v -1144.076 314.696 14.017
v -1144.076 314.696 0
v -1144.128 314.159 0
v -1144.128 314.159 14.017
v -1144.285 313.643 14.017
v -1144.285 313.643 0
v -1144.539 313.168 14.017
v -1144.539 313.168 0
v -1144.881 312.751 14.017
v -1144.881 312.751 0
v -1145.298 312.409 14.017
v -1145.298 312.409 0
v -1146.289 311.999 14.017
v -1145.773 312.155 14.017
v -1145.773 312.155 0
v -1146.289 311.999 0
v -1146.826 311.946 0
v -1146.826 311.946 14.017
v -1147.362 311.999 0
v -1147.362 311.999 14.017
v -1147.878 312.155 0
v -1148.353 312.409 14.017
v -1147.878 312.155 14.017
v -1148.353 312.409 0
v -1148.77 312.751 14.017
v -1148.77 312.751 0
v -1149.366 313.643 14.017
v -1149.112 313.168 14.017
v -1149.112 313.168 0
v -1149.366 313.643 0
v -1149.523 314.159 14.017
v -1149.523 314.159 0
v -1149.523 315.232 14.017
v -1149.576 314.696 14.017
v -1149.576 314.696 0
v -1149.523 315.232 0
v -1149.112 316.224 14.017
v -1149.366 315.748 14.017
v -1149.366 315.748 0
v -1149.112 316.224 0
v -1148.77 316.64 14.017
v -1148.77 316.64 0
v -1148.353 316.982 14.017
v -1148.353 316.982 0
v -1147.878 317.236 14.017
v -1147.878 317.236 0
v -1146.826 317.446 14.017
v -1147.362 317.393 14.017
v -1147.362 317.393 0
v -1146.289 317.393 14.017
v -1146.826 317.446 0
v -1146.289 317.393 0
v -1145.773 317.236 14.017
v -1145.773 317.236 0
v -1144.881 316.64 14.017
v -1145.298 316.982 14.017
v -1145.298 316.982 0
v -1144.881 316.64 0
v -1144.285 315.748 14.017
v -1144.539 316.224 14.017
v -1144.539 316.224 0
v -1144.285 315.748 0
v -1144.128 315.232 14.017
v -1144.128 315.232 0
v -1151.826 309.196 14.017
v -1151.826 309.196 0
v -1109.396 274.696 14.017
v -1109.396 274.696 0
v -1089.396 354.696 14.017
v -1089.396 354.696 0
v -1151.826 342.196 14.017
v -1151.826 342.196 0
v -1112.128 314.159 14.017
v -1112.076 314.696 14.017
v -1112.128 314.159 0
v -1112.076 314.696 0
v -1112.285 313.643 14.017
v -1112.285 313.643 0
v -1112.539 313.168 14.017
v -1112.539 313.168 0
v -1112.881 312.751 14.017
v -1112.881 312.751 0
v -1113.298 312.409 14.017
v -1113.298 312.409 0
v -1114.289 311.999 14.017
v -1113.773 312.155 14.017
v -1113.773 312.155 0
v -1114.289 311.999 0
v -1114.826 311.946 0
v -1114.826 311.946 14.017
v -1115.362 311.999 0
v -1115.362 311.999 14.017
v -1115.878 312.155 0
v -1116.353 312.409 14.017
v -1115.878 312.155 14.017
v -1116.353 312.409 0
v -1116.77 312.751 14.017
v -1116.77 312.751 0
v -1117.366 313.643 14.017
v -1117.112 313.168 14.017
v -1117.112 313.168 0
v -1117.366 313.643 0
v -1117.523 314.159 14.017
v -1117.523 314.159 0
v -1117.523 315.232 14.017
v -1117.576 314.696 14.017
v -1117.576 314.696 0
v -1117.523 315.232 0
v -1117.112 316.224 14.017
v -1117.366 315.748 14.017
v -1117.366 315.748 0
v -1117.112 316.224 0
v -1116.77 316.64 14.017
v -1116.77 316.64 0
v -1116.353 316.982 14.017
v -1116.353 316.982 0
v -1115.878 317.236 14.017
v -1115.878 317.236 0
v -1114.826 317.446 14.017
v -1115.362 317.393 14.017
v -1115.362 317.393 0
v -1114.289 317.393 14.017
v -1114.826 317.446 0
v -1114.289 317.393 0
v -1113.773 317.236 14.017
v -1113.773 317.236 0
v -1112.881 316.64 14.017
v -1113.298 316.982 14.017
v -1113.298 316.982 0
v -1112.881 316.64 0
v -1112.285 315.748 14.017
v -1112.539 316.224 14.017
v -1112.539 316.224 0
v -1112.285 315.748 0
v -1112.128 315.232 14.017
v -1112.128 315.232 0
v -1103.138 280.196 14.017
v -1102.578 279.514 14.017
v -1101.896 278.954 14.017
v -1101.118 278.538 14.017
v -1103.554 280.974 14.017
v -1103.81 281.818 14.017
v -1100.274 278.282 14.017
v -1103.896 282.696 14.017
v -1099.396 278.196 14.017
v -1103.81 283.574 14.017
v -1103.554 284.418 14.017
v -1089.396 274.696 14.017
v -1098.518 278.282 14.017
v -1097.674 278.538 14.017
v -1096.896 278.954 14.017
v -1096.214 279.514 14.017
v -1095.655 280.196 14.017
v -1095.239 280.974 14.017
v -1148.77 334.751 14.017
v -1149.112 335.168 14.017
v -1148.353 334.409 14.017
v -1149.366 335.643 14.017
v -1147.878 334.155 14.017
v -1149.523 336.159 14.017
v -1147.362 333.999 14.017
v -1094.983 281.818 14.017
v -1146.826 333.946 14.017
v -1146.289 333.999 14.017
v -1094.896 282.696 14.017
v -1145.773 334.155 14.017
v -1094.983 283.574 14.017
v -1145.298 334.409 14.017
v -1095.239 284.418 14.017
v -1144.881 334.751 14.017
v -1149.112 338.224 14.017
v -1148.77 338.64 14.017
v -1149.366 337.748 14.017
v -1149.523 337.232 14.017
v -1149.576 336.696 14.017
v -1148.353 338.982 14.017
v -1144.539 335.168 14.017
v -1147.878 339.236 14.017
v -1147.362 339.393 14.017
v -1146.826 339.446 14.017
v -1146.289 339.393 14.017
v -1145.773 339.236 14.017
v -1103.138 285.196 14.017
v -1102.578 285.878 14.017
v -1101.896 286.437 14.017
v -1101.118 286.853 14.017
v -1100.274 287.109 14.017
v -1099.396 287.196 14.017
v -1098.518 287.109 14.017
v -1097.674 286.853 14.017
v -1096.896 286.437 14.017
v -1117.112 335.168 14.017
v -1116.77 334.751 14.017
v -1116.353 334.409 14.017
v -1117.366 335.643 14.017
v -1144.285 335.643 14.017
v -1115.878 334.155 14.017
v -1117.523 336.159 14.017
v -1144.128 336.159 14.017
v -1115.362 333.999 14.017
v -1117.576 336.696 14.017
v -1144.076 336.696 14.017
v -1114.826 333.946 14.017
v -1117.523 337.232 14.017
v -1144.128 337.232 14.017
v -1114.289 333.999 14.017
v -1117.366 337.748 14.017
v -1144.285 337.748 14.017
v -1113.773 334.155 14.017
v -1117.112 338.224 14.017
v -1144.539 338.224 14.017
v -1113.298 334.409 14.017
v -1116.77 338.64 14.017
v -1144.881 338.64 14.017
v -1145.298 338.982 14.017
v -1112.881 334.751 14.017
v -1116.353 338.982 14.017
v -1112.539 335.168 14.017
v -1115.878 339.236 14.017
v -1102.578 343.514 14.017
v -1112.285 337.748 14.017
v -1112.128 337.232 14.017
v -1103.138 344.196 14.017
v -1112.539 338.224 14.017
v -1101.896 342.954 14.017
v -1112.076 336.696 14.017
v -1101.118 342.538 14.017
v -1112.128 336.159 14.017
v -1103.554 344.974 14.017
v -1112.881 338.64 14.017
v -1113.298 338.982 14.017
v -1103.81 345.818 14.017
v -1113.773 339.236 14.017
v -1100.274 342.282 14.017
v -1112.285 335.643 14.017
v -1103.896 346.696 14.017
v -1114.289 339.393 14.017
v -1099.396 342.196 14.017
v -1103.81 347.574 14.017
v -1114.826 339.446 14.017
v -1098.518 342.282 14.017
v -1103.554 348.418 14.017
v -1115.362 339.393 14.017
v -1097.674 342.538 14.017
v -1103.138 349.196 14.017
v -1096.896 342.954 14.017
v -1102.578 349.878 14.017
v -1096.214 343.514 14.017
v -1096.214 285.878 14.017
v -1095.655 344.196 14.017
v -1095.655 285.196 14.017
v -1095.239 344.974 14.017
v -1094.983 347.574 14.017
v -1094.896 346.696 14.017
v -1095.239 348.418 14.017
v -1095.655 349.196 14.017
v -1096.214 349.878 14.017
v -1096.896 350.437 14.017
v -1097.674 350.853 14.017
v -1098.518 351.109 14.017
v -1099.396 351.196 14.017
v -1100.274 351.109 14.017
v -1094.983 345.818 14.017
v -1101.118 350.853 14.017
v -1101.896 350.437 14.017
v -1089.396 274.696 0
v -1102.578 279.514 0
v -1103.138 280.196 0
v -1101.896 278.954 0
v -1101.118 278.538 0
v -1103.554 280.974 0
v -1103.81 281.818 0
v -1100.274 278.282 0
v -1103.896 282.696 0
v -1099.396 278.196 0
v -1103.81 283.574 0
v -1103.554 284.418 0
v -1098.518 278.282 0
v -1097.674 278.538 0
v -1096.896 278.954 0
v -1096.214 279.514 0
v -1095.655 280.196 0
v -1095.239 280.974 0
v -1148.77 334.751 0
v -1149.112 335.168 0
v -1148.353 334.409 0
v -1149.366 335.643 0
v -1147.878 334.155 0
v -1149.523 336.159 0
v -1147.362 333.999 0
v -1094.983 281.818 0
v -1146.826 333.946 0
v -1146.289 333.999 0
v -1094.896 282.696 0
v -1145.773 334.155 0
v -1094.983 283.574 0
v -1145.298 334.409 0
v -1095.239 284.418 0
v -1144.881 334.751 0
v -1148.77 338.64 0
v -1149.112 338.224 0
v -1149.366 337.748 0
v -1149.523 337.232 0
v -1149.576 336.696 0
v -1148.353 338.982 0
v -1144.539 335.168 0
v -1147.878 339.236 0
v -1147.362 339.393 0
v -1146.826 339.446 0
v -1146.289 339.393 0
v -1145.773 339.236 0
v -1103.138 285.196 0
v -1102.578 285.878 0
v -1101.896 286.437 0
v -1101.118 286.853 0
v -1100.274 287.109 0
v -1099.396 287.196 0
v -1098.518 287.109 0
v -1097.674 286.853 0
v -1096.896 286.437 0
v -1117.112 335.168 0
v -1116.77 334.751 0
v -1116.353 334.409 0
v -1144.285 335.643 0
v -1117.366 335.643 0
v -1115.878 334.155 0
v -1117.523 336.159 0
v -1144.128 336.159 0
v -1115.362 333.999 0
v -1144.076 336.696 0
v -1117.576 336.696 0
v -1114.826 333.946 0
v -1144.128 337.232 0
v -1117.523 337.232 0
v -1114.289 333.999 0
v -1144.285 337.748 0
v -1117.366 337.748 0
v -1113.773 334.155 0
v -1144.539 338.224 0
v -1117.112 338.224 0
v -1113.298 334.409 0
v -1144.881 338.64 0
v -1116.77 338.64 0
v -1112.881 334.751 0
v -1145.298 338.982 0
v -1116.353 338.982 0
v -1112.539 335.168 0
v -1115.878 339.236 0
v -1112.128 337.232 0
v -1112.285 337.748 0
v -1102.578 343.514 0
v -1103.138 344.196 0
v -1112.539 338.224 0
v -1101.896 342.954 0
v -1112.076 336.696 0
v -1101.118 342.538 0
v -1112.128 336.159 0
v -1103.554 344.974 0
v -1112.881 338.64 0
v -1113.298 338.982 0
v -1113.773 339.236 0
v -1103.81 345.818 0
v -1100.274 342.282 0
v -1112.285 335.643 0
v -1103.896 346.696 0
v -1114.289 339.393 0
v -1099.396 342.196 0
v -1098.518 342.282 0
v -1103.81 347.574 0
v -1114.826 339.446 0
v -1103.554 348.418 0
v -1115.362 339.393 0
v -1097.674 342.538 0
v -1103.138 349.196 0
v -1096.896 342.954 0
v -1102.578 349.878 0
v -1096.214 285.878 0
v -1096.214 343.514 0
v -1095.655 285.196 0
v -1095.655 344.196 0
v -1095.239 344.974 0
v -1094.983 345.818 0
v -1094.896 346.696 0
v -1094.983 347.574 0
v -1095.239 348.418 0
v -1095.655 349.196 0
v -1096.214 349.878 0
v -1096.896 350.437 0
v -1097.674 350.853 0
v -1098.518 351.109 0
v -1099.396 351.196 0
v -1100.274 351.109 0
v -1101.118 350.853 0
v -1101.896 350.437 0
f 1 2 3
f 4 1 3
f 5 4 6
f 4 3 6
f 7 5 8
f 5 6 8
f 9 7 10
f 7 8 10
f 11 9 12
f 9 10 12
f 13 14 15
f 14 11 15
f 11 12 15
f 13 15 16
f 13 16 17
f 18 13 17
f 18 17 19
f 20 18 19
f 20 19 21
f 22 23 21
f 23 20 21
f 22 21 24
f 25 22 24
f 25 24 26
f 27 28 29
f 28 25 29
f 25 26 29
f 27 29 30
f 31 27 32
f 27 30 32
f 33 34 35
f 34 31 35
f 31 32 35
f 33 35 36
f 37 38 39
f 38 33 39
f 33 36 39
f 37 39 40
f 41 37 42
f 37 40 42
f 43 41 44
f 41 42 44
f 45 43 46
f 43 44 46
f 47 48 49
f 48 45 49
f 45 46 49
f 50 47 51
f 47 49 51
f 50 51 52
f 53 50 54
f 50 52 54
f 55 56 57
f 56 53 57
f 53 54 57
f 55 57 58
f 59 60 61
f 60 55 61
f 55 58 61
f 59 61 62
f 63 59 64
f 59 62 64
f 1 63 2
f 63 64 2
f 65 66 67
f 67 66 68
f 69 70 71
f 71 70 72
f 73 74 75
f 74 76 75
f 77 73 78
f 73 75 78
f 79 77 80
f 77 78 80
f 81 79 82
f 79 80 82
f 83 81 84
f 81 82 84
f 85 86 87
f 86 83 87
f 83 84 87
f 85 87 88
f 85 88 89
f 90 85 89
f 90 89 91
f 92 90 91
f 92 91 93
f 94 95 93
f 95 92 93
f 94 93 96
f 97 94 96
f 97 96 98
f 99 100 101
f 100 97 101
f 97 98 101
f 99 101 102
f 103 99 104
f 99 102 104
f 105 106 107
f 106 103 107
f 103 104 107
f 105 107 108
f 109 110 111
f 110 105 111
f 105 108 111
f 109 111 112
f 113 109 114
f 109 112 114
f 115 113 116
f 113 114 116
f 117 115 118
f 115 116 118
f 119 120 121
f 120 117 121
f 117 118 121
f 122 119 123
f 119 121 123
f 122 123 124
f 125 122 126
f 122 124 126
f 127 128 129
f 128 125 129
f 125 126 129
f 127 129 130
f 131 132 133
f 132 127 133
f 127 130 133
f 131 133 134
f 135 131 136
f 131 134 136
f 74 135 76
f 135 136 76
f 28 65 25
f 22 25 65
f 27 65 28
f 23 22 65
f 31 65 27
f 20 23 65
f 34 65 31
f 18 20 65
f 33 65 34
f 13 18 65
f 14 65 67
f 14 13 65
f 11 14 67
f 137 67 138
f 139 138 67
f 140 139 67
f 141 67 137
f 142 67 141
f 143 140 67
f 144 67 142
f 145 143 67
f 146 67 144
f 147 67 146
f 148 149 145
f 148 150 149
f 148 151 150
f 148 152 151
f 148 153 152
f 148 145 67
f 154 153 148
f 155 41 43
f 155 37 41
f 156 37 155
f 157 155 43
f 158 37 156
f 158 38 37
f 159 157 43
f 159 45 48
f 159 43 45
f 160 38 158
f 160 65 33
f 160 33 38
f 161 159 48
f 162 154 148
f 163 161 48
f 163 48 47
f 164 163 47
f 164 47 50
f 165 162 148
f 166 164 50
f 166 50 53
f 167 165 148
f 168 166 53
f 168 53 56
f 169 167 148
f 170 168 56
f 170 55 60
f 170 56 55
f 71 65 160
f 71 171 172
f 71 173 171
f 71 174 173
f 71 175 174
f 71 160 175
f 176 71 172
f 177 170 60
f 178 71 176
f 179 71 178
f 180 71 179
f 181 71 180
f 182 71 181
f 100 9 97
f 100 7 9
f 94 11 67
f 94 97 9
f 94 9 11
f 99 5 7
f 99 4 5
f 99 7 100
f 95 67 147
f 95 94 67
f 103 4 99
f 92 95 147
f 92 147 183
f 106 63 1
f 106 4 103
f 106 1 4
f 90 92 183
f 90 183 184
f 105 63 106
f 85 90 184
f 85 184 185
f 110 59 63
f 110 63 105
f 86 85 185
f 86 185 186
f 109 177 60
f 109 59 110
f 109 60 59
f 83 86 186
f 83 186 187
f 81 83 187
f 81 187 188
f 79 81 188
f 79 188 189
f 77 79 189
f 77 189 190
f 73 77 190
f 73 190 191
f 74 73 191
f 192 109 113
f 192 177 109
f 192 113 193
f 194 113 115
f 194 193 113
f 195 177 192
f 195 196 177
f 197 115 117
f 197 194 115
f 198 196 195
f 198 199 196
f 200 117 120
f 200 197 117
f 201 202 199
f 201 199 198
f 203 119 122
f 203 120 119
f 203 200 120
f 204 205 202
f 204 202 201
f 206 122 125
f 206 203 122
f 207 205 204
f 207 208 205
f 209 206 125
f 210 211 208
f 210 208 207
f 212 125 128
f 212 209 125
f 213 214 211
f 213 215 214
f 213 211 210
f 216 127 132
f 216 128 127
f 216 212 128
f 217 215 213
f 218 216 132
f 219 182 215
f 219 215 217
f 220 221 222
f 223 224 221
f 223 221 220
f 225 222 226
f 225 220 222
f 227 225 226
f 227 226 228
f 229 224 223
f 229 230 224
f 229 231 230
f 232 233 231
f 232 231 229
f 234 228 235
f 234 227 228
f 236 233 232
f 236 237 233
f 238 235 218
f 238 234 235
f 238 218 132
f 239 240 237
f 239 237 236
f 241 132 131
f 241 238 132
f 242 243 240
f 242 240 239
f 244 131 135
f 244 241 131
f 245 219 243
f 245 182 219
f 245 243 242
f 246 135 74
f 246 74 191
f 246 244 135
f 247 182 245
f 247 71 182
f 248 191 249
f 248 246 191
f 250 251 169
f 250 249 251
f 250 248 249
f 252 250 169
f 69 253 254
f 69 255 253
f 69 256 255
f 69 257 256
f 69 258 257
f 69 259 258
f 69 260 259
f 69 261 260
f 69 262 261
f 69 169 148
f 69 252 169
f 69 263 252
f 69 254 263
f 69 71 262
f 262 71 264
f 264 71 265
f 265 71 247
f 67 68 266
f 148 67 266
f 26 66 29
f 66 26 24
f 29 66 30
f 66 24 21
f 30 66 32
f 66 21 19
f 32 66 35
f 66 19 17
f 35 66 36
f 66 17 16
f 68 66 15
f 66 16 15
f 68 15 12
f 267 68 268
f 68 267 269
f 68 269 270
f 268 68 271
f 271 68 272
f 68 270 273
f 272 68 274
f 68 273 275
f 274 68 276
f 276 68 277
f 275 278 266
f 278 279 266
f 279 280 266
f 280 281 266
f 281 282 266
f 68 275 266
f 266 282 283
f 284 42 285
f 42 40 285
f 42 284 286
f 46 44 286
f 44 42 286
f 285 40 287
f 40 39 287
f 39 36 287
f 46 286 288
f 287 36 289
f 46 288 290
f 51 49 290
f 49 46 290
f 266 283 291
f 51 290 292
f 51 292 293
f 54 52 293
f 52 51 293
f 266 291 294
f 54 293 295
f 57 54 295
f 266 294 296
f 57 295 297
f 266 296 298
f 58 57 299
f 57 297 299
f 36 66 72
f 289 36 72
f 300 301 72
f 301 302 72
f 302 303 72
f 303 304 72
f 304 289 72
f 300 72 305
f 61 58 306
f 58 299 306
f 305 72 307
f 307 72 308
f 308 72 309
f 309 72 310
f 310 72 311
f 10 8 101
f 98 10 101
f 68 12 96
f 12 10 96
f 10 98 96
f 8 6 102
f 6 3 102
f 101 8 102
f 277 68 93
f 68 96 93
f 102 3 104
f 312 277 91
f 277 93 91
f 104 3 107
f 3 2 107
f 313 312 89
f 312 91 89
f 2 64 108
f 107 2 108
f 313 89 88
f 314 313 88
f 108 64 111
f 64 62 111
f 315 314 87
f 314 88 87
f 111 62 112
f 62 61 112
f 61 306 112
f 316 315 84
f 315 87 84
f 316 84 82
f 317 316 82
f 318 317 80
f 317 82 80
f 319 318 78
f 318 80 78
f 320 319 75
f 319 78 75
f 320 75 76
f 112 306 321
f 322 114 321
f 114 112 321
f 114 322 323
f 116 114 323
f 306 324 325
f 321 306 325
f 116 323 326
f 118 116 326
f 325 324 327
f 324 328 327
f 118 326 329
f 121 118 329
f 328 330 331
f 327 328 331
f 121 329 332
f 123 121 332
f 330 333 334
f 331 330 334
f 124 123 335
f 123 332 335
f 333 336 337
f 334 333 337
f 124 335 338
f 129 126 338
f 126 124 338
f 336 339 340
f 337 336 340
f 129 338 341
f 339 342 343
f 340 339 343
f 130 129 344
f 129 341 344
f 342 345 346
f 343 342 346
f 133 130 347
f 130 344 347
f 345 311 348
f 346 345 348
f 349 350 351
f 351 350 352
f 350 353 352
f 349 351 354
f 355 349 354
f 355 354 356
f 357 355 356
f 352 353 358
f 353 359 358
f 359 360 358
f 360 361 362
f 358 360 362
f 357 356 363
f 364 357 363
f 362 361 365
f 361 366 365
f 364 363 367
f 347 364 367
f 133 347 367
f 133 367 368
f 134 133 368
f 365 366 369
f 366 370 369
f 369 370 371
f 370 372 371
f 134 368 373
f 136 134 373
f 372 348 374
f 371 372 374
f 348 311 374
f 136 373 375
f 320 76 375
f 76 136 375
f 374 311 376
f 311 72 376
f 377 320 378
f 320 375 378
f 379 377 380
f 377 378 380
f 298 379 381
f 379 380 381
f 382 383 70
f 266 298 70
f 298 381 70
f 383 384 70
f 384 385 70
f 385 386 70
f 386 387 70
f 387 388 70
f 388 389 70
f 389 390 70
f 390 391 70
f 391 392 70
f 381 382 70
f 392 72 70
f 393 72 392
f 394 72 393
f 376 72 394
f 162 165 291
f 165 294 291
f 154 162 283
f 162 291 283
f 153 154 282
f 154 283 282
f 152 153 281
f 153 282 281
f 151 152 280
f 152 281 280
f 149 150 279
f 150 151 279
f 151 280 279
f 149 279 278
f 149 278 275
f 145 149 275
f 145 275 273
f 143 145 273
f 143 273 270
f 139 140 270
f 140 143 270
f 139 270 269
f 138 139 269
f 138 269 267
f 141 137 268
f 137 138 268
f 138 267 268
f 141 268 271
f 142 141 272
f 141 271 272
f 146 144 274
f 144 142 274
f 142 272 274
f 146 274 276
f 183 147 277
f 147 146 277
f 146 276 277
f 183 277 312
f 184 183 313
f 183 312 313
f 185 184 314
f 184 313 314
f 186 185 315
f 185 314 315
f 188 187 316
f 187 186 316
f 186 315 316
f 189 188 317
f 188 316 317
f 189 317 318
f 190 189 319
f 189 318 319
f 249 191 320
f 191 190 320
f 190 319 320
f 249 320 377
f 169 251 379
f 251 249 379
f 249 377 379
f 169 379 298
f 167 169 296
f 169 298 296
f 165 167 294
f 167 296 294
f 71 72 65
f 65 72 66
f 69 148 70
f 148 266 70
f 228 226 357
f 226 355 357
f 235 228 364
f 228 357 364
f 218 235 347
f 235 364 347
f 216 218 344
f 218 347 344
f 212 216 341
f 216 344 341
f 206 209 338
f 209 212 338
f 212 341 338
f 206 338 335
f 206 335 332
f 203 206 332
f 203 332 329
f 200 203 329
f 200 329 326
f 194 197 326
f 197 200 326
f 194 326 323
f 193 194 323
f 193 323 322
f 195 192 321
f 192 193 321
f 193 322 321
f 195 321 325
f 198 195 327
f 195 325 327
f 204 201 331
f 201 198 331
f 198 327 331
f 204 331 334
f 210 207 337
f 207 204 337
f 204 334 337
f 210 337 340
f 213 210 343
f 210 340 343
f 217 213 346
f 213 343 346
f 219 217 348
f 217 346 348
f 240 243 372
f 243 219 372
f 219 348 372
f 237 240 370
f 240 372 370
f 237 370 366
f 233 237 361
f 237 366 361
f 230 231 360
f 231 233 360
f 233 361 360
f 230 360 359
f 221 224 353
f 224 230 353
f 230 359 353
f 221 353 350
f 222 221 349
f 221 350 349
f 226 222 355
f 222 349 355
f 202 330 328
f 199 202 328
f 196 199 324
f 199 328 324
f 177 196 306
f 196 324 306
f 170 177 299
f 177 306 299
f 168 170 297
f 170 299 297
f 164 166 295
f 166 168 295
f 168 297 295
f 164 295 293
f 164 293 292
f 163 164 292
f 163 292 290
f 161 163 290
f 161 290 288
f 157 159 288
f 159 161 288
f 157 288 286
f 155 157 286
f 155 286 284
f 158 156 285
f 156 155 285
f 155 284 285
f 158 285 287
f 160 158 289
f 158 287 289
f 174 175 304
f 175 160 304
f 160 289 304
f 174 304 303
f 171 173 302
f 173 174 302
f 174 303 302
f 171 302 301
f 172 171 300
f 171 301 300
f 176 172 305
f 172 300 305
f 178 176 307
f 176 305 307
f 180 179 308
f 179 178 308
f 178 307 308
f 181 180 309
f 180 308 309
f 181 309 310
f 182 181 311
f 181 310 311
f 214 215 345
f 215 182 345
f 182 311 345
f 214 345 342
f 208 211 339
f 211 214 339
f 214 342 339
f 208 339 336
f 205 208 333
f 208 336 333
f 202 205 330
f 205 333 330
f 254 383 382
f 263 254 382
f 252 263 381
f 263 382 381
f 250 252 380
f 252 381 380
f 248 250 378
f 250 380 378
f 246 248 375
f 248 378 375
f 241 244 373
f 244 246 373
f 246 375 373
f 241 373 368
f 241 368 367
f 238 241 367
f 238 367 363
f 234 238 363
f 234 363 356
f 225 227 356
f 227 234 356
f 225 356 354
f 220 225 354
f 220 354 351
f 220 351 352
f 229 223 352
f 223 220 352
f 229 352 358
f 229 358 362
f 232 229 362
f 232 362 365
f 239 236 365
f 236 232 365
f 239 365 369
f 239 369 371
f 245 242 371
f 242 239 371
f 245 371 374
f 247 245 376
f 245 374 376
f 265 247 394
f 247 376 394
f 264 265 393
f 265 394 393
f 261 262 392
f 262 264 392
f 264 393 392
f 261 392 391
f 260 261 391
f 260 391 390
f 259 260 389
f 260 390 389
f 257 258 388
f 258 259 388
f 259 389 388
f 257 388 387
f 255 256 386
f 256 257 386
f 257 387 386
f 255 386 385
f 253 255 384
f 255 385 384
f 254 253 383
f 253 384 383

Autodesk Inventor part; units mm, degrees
ref_plane "YZ Plane" through (0, 0, 0) normal (1, 0, 0) x (0, 1, 0)
ref_plane "XZ Plane" through (0, 0, 0) normal (0, 1, 0) x (-1, 0, 0)
ref_plane "XY Plane" through (0, 0, 0) normal (0, 0, 1) x (1, 0, 0)
sketch "スケッチ1 outline for 押し出し1" plane through (0, 0, 0) normal (0, 0, 1) x (1, 0, 0)
  line L0 (-1089.396157, 354.695803) -> (-1151.82556, 342.195803)
  line L1 (-1089.396157, 274.695803) -> (-1089.396157, 354.695803)
  line L2 (-1151.82556, 342.195803) -> (-1151.82556, 309.195803)
  line L3 (-1109.396157, 274.695803) -> (-1089.396157, 274.695803)
  line L4 (-1151.82556, 309.195803) -> (-1109.396157, 274.695803)
  circle A0 centre (-1099.396157, 282.695803) radius 4.5
  circle A1 centre (-1146.82556, 314.695803) radius 2.75
  circle A2 centre (-1146.82556, 336.695803) radius 2.75
  circle A3 centre (-1114.82556, 314.695803) radius 2.75
  circle A4 centre (-1114.82556, 336.695803) radius 2.75
  circle A5 centre (-1099.396157, 346.695803) radius 4.5
extrude "押し出し1" add sketch "スケッチ1 outline for 押し出し1" along normal blind 14.016552
